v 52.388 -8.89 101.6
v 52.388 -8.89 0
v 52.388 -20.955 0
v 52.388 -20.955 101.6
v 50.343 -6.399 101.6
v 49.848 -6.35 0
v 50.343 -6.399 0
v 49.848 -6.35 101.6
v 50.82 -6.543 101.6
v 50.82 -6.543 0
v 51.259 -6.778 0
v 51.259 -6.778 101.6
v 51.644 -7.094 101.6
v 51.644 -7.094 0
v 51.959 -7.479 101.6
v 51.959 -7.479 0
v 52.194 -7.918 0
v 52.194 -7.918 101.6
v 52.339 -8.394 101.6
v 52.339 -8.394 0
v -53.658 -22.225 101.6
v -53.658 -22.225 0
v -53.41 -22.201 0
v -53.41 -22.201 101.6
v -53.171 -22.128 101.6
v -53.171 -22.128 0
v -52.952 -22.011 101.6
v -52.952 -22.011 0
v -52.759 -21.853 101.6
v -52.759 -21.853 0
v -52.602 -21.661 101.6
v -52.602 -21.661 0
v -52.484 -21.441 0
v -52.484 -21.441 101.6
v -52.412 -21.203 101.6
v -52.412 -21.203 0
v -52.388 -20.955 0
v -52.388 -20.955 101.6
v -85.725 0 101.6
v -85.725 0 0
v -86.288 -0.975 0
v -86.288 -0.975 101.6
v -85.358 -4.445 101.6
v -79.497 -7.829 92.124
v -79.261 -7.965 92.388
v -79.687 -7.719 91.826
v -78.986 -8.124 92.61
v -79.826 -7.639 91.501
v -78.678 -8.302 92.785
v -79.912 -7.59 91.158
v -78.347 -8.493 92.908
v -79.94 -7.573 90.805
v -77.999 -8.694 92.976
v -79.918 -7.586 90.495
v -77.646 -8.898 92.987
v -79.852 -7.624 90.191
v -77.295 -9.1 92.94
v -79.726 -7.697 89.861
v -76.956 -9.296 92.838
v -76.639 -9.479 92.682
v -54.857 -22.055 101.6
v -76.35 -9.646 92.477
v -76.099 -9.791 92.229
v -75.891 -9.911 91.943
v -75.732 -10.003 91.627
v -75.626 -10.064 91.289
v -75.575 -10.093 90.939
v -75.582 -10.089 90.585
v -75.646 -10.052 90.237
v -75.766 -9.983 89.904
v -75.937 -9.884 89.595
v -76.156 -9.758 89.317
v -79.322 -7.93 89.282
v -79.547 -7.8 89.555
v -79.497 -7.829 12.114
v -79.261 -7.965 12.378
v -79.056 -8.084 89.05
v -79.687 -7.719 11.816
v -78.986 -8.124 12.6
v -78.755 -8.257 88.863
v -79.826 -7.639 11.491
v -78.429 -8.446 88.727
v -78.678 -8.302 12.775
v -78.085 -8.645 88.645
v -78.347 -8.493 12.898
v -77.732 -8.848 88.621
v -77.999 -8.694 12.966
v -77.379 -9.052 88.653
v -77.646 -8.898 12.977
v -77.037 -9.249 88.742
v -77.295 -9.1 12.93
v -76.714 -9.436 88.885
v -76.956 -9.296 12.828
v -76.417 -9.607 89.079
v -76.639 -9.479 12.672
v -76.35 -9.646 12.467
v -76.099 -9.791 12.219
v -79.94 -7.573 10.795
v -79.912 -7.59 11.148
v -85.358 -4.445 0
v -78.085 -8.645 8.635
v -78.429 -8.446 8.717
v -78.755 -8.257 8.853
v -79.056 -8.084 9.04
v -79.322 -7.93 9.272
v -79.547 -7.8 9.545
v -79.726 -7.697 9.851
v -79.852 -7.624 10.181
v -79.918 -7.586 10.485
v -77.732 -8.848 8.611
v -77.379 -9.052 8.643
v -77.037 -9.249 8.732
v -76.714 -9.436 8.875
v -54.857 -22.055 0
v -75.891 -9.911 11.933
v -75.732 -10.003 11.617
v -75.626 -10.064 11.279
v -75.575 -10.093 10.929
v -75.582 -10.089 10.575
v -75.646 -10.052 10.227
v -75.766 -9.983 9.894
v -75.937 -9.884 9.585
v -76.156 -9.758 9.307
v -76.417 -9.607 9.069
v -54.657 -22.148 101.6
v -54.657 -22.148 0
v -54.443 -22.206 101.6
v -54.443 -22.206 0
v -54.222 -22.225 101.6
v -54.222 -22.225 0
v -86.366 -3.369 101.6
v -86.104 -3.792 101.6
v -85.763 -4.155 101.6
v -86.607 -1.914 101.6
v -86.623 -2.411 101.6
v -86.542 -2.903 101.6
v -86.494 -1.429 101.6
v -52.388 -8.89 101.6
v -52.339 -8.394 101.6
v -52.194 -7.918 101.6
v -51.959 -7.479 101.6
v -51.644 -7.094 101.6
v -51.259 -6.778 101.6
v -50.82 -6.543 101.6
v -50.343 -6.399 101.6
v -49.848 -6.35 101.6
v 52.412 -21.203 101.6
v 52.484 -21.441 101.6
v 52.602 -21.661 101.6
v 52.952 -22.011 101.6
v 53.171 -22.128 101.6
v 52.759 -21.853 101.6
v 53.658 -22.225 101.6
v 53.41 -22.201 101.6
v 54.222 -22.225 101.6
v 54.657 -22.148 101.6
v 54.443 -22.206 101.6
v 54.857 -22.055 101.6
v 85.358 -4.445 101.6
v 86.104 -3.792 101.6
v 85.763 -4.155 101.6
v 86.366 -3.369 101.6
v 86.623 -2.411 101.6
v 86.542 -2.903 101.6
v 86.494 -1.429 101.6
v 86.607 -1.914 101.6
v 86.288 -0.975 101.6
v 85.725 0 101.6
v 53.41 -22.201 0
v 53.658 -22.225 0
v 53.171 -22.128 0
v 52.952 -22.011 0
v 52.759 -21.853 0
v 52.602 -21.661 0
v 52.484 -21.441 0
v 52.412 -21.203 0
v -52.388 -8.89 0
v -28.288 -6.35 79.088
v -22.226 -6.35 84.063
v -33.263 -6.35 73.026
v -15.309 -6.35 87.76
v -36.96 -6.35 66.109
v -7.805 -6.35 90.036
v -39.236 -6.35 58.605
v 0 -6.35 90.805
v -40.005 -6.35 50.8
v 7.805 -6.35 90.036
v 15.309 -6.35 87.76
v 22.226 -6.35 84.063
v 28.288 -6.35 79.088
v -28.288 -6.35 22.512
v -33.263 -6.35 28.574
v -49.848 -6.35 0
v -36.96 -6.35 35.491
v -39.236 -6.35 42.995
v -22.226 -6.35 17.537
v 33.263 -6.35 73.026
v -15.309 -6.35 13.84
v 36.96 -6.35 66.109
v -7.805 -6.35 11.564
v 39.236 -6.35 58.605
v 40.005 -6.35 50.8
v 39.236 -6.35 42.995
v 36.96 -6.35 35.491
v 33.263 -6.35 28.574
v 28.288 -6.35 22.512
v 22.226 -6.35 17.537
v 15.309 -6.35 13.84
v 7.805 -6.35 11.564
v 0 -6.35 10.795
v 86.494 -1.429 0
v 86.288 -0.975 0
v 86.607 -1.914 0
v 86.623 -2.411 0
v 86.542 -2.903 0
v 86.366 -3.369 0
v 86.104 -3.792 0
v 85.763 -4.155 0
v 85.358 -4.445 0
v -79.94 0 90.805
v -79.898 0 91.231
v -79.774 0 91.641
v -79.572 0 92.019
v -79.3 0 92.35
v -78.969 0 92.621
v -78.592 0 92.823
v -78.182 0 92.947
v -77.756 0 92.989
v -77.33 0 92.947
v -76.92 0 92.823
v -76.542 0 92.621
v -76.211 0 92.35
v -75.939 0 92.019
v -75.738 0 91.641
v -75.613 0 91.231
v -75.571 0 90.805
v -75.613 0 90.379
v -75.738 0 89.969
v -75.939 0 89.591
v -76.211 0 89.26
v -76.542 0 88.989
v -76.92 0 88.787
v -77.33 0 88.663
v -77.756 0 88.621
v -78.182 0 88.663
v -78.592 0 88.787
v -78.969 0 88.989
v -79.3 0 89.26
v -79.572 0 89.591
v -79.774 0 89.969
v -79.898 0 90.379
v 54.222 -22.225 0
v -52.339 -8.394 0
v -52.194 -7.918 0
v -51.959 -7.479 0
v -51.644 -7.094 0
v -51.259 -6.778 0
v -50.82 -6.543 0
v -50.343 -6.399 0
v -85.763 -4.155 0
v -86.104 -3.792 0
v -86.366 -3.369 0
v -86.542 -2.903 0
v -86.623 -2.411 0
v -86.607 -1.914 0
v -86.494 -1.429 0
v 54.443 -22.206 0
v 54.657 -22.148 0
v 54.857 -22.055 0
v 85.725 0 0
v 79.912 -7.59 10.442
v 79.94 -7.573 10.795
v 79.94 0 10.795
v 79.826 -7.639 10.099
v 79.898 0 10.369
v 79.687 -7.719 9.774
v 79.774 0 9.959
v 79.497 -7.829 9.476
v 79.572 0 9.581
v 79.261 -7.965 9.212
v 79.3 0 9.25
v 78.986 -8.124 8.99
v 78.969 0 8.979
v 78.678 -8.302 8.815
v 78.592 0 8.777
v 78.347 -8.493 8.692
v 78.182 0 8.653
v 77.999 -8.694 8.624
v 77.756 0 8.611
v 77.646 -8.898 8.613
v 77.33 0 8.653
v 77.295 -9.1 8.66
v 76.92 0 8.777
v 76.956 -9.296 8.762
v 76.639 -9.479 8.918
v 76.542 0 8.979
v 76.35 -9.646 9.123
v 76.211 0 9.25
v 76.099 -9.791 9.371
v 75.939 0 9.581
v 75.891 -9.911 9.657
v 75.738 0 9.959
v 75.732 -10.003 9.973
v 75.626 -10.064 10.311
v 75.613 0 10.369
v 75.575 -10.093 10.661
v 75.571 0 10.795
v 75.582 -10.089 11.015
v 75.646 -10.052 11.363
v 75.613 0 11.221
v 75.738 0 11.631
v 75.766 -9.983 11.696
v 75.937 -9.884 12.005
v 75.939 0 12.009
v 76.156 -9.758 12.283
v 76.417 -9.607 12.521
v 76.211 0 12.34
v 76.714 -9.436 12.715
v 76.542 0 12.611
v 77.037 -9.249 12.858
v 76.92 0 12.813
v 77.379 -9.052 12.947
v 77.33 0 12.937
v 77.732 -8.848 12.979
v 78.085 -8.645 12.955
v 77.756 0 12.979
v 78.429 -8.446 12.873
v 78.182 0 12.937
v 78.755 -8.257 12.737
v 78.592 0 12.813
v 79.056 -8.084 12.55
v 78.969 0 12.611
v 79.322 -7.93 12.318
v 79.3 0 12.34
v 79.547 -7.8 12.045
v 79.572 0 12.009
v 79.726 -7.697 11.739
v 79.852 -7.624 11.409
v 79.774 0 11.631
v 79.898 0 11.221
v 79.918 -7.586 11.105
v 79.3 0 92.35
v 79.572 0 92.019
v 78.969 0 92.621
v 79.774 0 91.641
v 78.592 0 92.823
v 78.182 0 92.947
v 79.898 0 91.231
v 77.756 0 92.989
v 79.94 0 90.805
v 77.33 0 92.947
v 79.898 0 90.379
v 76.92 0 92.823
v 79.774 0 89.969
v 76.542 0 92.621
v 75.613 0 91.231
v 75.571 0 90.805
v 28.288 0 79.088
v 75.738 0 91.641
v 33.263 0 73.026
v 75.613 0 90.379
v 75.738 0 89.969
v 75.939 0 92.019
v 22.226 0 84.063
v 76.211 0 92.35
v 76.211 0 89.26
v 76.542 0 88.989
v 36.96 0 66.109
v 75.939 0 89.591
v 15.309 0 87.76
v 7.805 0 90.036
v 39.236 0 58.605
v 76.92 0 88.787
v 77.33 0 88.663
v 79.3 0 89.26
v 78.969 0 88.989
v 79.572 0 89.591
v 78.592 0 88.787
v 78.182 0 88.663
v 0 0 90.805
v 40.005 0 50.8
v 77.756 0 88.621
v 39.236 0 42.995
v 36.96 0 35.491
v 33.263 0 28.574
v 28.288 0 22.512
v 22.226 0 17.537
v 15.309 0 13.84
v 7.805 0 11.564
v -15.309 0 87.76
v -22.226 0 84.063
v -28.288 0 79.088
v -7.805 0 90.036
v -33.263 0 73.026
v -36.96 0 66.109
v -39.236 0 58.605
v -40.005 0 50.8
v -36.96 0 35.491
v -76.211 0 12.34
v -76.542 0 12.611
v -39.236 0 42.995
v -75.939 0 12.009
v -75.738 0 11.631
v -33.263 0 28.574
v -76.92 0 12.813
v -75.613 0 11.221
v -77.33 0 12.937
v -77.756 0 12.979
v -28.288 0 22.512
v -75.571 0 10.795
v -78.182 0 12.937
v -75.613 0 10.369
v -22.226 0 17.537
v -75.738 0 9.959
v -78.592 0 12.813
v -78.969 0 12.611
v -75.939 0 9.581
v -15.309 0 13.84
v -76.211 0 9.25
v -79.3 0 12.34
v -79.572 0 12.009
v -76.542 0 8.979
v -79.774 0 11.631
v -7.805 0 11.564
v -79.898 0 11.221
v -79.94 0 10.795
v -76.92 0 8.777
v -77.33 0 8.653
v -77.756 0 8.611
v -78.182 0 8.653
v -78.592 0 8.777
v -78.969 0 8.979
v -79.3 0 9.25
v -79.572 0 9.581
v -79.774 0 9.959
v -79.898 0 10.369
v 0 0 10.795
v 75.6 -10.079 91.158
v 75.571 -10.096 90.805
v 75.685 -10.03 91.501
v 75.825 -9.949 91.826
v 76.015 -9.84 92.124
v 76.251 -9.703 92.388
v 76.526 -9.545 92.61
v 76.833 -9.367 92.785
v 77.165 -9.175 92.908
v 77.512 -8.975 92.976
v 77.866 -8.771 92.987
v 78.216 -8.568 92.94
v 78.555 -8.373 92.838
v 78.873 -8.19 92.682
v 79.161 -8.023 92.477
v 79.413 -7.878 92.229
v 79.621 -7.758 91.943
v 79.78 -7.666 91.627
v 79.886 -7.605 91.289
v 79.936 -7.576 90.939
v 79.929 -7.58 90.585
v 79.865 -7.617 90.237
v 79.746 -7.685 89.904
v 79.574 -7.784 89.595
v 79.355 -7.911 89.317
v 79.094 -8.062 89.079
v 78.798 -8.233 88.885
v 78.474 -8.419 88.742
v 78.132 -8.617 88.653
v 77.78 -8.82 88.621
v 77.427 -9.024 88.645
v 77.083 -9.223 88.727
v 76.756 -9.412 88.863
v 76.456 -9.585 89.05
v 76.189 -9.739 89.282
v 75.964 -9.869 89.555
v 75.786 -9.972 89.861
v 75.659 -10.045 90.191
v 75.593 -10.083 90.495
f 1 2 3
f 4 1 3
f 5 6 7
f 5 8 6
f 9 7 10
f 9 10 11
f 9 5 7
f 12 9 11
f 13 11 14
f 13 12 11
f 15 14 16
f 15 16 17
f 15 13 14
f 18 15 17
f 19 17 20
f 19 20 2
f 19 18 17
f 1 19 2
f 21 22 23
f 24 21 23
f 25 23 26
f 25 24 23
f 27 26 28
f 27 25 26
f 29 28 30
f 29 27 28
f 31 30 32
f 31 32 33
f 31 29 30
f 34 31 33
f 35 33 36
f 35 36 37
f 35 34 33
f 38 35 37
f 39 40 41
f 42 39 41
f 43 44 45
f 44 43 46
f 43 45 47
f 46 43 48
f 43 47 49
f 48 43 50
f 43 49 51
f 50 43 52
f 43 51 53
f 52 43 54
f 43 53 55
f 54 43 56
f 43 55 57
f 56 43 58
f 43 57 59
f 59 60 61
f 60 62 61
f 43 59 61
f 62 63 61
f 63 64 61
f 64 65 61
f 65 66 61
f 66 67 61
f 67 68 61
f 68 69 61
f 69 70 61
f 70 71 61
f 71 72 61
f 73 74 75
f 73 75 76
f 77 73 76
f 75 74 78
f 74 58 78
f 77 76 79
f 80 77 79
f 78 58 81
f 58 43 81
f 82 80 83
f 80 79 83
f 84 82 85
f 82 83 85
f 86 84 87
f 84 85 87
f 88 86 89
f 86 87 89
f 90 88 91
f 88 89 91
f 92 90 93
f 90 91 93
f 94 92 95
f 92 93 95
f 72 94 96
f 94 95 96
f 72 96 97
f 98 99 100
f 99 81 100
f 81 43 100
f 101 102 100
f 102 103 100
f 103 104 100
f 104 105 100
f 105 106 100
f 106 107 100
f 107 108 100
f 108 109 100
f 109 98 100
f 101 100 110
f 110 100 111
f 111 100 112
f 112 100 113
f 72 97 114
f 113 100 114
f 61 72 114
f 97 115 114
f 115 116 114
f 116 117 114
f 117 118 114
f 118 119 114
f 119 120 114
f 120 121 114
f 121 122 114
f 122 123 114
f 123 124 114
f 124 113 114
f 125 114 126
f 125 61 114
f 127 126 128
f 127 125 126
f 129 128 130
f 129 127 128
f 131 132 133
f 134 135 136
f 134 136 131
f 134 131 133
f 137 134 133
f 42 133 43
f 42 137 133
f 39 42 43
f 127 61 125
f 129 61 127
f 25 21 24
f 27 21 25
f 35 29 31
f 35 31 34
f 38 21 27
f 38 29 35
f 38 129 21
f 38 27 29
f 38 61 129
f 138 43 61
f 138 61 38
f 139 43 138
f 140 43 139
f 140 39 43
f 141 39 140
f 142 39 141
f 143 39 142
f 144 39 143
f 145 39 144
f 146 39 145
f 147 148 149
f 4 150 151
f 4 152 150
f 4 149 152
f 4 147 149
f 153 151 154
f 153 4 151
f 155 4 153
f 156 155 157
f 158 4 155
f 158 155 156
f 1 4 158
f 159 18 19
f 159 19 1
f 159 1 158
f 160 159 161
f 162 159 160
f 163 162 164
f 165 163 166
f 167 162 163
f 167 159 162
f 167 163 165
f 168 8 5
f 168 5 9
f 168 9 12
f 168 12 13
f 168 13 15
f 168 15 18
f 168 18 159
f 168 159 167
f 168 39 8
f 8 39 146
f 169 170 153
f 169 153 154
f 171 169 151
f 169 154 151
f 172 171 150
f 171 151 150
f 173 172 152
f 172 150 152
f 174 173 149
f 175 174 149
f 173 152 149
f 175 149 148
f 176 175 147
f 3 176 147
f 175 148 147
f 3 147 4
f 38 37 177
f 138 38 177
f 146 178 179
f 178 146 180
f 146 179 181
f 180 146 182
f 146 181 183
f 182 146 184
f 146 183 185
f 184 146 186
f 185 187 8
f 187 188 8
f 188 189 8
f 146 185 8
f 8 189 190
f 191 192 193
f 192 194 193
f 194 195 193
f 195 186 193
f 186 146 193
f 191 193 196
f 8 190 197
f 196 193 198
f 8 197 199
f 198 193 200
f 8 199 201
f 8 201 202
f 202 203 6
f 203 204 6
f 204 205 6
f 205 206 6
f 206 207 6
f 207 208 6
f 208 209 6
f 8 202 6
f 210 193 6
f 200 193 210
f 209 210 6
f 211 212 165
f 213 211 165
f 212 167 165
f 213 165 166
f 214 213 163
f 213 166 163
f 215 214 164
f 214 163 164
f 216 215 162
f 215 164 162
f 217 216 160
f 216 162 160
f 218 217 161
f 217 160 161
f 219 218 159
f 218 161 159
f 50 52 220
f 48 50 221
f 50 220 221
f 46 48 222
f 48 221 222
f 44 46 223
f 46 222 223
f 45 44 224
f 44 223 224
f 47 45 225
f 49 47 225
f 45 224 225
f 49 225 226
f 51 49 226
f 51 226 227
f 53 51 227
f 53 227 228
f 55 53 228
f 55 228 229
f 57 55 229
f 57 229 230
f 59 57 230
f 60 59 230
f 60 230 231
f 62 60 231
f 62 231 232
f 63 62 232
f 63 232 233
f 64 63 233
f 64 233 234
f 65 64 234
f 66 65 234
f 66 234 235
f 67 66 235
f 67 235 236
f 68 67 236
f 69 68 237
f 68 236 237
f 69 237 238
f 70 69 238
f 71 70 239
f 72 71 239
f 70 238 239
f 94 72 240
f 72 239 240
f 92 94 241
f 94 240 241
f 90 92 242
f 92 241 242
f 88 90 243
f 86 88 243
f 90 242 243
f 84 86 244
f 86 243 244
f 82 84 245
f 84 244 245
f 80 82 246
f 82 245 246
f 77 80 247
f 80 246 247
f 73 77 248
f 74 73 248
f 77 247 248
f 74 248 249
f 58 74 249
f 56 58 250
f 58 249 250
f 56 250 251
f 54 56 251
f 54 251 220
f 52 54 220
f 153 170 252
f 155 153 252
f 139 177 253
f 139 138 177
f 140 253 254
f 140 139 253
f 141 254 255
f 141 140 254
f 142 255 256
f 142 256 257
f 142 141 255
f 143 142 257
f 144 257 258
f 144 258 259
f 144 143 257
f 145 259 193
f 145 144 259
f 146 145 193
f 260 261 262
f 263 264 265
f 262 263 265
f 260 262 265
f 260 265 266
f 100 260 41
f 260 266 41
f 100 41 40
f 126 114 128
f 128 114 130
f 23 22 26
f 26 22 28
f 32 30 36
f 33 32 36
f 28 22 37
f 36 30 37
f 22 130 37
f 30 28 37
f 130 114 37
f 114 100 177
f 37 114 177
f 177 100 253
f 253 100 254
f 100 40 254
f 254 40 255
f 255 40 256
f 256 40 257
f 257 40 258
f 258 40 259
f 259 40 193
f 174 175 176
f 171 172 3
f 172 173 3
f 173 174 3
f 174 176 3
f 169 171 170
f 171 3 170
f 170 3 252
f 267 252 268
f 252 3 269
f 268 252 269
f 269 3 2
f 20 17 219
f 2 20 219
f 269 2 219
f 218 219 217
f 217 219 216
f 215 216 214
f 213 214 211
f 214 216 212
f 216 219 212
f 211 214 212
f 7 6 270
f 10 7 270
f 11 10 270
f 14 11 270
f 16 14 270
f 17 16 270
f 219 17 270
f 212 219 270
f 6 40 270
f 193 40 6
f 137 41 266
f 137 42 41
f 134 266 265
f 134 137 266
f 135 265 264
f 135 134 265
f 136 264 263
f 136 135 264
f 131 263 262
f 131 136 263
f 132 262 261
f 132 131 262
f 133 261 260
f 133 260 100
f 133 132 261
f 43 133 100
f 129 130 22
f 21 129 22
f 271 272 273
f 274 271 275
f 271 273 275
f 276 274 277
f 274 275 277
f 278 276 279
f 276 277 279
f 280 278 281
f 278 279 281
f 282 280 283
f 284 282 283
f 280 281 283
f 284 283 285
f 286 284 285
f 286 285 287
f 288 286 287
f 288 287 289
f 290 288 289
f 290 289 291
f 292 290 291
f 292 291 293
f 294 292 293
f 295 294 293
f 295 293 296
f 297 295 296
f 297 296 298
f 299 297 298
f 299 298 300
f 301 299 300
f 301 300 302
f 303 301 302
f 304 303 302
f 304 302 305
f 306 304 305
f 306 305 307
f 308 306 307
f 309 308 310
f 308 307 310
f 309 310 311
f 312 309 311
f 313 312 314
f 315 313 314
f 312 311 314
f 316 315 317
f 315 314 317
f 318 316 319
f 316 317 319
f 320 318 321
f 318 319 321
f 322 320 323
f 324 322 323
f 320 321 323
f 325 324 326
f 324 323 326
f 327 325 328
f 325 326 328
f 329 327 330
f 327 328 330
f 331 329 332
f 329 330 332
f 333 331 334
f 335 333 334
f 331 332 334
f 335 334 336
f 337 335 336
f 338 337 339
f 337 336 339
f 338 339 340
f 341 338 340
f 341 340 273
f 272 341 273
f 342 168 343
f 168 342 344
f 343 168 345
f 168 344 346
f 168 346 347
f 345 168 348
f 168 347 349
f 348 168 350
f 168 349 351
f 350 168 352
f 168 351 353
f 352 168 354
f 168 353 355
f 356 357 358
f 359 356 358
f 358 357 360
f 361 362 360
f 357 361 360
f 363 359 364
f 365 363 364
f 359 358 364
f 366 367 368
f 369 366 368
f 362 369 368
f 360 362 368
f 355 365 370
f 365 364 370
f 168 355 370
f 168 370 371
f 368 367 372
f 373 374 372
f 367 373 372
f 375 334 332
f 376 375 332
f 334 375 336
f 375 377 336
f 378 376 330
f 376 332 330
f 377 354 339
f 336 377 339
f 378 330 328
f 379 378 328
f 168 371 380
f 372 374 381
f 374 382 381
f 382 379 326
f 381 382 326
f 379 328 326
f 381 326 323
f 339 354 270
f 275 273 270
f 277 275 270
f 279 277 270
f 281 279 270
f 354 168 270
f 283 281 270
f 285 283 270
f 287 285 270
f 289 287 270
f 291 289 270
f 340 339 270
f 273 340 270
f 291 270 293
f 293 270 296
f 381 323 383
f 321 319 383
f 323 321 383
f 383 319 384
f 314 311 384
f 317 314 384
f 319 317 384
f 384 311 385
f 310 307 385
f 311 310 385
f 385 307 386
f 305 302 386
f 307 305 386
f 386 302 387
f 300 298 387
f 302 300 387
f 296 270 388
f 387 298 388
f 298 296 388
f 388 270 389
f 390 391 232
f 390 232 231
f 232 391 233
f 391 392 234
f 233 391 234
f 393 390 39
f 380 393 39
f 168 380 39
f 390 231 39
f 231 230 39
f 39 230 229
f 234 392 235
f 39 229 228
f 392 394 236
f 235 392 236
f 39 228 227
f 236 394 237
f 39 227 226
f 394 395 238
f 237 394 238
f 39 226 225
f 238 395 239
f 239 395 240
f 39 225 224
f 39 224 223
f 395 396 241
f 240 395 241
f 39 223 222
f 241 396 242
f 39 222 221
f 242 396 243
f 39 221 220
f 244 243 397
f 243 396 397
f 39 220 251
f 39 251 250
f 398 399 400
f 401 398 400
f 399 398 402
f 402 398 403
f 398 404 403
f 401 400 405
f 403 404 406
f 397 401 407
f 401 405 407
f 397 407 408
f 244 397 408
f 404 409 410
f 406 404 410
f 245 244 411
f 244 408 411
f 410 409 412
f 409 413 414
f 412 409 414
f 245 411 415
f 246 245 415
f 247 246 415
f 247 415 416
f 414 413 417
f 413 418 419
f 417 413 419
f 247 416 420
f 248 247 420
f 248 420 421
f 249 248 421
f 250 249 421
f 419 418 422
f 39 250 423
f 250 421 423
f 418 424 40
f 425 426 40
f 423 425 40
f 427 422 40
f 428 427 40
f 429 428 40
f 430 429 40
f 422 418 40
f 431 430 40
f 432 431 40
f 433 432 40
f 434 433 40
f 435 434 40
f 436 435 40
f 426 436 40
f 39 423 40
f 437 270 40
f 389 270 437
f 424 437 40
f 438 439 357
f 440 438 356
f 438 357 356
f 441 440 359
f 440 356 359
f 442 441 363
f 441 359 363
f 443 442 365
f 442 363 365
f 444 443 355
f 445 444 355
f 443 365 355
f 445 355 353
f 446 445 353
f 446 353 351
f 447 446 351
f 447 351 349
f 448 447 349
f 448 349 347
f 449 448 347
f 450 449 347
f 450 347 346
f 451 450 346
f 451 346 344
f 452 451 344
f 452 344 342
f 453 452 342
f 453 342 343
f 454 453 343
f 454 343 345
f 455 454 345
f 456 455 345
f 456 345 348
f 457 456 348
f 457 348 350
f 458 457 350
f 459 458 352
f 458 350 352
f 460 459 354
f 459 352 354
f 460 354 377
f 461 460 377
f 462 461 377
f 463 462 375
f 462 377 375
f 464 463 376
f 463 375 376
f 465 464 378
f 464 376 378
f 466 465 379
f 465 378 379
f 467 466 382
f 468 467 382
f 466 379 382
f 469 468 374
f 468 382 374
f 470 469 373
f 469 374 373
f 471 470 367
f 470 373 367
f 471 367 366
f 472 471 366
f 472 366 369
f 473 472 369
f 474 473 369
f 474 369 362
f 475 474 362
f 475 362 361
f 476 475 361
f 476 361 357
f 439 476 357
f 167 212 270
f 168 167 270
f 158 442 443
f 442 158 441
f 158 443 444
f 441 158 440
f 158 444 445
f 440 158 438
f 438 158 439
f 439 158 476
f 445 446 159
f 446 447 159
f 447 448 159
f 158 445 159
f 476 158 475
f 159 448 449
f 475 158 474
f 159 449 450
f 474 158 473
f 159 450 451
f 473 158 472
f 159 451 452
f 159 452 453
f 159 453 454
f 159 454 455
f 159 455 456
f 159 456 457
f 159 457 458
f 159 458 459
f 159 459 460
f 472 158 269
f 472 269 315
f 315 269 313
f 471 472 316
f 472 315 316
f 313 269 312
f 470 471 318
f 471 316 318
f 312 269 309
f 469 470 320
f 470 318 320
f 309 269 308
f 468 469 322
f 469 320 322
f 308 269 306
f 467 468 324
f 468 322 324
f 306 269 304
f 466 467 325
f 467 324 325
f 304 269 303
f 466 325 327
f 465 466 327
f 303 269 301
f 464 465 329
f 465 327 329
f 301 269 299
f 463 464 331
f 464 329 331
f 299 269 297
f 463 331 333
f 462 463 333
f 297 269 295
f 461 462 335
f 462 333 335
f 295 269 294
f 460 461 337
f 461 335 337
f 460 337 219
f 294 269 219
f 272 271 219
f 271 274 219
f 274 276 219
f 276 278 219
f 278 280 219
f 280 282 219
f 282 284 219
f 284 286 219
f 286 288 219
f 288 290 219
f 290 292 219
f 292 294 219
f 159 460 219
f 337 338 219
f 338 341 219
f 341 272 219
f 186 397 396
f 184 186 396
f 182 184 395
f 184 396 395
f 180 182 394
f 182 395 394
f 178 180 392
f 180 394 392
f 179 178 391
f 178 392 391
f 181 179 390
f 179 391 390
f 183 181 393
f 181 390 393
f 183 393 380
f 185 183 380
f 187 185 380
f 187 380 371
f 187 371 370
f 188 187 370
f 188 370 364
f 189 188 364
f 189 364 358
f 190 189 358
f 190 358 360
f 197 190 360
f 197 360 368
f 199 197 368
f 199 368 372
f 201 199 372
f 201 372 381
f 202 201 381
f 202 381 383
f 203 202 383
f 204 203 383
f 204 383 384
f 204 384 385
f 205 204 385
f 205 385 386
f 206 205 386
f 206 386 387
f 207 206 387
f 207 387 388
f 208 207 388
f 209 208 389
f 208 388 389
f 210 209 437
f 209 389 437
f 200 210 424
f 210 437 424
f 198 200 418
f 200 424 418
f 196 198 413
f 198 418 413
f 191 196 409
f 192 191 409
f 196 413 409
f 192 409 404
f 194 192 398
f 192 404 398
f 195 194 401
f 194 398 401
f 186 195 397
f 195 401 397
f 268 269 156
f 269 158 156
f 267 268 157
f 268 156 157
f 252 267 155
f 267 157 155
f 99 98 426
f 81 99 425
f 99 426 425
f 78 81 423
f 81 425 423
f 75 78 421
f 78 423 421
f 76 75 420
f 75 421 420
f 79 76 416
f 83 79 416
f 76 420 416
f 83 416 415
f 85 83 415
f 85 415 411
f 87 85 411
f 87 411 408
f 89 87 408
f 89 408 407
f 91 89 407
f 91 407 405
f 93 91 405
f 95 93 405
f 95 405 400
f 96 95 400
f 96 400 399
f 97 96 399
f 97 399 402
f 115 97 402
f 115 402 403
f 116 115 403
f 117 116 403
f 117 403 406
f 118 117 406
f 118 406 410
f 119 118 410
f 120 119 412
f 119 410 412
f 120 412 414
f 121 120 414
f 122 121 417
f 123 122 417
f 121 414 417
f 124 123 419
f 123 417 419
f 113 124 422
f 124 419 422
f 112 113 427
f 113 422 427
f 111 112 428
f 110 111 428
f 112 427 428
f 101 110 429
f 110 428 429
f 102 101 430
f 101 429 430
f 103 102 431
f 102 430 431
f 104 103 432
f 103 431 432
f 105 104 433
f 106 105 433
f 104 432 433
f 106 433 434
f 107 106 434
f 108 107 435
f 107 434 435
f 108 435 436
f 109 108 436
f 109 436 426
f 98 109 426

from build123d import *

# Parameters (mm, degrees)
BOSS_EXTRUDE1_DEPTH = 101.6
SKETCH2_R           = 2.1844
SKETCH2_R_2         = 40.005
CUT_EXTRUDE1_DEPTH  = 136.951937251
FILLET1_R           = 2.54
FILLET2_R           = 1.27


with BuildPart() as part:
    # Sketch1 → Boss-Extrude1 (new body)
    with BuildSketch(Plane.XY):
        Polygon((85.725, 0), (-85.725, 0), (-87.558087105, -3.175), (-54.56251922, -22.225), (-52.3875, -22.225), (-52.3875, -6.35), (52.3875, -6.35), (52.3875, -22.225), (54.56251922, -22.225), (87.558087105, -3.175), align=None)
    extrude(amount=BOSS_EXTRUDE1_DEPTH)

    # Sketch2 → Cut-Extrude1 (cut, through all)
    with BuildSketch(Plane(origin=(0, 0, 0), x_dir=(1, 0, 0), z_dir=(0, 1, 0))):
        with Locations(Location((77.75575, -90.805, 0), (0, 0, 180))):
            Circle(SKETCH2_R)
        with Locations(Location((-77.75575, -90.805, 0), (0, 0, 180))):
            Circle(SKETCH2_R)
        with Locations(Location((-77.75575, -10.795, 0), (0, 0, 180))):
            Circle(SKETCH2_R)
        with Locations((77.75575, -10.795)):
            Circle(SKETCH2_R)
        with Locations(Location((0, -50.8, 0), (0, 0, 180))):
            Circle(SKETCH2_R_2)
    extrude(amount=-CUT_EXTRUDE1_DEPTH, mode=Mode.SUBTRACT)

    # Fillet1
    fillet1_edges = [part.edges().sort_by_distance(p)[0] for p in [
        (87.558087105, -3.175, 50.8),
        (52.3875, -6.35, 50.8),
        (-52.3875, -6.35, 50.8),
        (-87.558087105, -3.175, 50.8),
    ]]
    fillet(fillet1_edges, radius=FILLET1_R)

    # Fillet2
    fillet2_edges = [part.edges().sort_by_distance(p)[0] for p in [
        (54.56251922, -22.225, 50.8),
        (52.3875, -22.225, 50.8),
        (-52.3875, -22.225, 50.8),
        (-54.56251922, -22.225, 50.8),
    ]]
    fillet(fillet2_edges, radius=FILLET2_R)


solid = part.part
